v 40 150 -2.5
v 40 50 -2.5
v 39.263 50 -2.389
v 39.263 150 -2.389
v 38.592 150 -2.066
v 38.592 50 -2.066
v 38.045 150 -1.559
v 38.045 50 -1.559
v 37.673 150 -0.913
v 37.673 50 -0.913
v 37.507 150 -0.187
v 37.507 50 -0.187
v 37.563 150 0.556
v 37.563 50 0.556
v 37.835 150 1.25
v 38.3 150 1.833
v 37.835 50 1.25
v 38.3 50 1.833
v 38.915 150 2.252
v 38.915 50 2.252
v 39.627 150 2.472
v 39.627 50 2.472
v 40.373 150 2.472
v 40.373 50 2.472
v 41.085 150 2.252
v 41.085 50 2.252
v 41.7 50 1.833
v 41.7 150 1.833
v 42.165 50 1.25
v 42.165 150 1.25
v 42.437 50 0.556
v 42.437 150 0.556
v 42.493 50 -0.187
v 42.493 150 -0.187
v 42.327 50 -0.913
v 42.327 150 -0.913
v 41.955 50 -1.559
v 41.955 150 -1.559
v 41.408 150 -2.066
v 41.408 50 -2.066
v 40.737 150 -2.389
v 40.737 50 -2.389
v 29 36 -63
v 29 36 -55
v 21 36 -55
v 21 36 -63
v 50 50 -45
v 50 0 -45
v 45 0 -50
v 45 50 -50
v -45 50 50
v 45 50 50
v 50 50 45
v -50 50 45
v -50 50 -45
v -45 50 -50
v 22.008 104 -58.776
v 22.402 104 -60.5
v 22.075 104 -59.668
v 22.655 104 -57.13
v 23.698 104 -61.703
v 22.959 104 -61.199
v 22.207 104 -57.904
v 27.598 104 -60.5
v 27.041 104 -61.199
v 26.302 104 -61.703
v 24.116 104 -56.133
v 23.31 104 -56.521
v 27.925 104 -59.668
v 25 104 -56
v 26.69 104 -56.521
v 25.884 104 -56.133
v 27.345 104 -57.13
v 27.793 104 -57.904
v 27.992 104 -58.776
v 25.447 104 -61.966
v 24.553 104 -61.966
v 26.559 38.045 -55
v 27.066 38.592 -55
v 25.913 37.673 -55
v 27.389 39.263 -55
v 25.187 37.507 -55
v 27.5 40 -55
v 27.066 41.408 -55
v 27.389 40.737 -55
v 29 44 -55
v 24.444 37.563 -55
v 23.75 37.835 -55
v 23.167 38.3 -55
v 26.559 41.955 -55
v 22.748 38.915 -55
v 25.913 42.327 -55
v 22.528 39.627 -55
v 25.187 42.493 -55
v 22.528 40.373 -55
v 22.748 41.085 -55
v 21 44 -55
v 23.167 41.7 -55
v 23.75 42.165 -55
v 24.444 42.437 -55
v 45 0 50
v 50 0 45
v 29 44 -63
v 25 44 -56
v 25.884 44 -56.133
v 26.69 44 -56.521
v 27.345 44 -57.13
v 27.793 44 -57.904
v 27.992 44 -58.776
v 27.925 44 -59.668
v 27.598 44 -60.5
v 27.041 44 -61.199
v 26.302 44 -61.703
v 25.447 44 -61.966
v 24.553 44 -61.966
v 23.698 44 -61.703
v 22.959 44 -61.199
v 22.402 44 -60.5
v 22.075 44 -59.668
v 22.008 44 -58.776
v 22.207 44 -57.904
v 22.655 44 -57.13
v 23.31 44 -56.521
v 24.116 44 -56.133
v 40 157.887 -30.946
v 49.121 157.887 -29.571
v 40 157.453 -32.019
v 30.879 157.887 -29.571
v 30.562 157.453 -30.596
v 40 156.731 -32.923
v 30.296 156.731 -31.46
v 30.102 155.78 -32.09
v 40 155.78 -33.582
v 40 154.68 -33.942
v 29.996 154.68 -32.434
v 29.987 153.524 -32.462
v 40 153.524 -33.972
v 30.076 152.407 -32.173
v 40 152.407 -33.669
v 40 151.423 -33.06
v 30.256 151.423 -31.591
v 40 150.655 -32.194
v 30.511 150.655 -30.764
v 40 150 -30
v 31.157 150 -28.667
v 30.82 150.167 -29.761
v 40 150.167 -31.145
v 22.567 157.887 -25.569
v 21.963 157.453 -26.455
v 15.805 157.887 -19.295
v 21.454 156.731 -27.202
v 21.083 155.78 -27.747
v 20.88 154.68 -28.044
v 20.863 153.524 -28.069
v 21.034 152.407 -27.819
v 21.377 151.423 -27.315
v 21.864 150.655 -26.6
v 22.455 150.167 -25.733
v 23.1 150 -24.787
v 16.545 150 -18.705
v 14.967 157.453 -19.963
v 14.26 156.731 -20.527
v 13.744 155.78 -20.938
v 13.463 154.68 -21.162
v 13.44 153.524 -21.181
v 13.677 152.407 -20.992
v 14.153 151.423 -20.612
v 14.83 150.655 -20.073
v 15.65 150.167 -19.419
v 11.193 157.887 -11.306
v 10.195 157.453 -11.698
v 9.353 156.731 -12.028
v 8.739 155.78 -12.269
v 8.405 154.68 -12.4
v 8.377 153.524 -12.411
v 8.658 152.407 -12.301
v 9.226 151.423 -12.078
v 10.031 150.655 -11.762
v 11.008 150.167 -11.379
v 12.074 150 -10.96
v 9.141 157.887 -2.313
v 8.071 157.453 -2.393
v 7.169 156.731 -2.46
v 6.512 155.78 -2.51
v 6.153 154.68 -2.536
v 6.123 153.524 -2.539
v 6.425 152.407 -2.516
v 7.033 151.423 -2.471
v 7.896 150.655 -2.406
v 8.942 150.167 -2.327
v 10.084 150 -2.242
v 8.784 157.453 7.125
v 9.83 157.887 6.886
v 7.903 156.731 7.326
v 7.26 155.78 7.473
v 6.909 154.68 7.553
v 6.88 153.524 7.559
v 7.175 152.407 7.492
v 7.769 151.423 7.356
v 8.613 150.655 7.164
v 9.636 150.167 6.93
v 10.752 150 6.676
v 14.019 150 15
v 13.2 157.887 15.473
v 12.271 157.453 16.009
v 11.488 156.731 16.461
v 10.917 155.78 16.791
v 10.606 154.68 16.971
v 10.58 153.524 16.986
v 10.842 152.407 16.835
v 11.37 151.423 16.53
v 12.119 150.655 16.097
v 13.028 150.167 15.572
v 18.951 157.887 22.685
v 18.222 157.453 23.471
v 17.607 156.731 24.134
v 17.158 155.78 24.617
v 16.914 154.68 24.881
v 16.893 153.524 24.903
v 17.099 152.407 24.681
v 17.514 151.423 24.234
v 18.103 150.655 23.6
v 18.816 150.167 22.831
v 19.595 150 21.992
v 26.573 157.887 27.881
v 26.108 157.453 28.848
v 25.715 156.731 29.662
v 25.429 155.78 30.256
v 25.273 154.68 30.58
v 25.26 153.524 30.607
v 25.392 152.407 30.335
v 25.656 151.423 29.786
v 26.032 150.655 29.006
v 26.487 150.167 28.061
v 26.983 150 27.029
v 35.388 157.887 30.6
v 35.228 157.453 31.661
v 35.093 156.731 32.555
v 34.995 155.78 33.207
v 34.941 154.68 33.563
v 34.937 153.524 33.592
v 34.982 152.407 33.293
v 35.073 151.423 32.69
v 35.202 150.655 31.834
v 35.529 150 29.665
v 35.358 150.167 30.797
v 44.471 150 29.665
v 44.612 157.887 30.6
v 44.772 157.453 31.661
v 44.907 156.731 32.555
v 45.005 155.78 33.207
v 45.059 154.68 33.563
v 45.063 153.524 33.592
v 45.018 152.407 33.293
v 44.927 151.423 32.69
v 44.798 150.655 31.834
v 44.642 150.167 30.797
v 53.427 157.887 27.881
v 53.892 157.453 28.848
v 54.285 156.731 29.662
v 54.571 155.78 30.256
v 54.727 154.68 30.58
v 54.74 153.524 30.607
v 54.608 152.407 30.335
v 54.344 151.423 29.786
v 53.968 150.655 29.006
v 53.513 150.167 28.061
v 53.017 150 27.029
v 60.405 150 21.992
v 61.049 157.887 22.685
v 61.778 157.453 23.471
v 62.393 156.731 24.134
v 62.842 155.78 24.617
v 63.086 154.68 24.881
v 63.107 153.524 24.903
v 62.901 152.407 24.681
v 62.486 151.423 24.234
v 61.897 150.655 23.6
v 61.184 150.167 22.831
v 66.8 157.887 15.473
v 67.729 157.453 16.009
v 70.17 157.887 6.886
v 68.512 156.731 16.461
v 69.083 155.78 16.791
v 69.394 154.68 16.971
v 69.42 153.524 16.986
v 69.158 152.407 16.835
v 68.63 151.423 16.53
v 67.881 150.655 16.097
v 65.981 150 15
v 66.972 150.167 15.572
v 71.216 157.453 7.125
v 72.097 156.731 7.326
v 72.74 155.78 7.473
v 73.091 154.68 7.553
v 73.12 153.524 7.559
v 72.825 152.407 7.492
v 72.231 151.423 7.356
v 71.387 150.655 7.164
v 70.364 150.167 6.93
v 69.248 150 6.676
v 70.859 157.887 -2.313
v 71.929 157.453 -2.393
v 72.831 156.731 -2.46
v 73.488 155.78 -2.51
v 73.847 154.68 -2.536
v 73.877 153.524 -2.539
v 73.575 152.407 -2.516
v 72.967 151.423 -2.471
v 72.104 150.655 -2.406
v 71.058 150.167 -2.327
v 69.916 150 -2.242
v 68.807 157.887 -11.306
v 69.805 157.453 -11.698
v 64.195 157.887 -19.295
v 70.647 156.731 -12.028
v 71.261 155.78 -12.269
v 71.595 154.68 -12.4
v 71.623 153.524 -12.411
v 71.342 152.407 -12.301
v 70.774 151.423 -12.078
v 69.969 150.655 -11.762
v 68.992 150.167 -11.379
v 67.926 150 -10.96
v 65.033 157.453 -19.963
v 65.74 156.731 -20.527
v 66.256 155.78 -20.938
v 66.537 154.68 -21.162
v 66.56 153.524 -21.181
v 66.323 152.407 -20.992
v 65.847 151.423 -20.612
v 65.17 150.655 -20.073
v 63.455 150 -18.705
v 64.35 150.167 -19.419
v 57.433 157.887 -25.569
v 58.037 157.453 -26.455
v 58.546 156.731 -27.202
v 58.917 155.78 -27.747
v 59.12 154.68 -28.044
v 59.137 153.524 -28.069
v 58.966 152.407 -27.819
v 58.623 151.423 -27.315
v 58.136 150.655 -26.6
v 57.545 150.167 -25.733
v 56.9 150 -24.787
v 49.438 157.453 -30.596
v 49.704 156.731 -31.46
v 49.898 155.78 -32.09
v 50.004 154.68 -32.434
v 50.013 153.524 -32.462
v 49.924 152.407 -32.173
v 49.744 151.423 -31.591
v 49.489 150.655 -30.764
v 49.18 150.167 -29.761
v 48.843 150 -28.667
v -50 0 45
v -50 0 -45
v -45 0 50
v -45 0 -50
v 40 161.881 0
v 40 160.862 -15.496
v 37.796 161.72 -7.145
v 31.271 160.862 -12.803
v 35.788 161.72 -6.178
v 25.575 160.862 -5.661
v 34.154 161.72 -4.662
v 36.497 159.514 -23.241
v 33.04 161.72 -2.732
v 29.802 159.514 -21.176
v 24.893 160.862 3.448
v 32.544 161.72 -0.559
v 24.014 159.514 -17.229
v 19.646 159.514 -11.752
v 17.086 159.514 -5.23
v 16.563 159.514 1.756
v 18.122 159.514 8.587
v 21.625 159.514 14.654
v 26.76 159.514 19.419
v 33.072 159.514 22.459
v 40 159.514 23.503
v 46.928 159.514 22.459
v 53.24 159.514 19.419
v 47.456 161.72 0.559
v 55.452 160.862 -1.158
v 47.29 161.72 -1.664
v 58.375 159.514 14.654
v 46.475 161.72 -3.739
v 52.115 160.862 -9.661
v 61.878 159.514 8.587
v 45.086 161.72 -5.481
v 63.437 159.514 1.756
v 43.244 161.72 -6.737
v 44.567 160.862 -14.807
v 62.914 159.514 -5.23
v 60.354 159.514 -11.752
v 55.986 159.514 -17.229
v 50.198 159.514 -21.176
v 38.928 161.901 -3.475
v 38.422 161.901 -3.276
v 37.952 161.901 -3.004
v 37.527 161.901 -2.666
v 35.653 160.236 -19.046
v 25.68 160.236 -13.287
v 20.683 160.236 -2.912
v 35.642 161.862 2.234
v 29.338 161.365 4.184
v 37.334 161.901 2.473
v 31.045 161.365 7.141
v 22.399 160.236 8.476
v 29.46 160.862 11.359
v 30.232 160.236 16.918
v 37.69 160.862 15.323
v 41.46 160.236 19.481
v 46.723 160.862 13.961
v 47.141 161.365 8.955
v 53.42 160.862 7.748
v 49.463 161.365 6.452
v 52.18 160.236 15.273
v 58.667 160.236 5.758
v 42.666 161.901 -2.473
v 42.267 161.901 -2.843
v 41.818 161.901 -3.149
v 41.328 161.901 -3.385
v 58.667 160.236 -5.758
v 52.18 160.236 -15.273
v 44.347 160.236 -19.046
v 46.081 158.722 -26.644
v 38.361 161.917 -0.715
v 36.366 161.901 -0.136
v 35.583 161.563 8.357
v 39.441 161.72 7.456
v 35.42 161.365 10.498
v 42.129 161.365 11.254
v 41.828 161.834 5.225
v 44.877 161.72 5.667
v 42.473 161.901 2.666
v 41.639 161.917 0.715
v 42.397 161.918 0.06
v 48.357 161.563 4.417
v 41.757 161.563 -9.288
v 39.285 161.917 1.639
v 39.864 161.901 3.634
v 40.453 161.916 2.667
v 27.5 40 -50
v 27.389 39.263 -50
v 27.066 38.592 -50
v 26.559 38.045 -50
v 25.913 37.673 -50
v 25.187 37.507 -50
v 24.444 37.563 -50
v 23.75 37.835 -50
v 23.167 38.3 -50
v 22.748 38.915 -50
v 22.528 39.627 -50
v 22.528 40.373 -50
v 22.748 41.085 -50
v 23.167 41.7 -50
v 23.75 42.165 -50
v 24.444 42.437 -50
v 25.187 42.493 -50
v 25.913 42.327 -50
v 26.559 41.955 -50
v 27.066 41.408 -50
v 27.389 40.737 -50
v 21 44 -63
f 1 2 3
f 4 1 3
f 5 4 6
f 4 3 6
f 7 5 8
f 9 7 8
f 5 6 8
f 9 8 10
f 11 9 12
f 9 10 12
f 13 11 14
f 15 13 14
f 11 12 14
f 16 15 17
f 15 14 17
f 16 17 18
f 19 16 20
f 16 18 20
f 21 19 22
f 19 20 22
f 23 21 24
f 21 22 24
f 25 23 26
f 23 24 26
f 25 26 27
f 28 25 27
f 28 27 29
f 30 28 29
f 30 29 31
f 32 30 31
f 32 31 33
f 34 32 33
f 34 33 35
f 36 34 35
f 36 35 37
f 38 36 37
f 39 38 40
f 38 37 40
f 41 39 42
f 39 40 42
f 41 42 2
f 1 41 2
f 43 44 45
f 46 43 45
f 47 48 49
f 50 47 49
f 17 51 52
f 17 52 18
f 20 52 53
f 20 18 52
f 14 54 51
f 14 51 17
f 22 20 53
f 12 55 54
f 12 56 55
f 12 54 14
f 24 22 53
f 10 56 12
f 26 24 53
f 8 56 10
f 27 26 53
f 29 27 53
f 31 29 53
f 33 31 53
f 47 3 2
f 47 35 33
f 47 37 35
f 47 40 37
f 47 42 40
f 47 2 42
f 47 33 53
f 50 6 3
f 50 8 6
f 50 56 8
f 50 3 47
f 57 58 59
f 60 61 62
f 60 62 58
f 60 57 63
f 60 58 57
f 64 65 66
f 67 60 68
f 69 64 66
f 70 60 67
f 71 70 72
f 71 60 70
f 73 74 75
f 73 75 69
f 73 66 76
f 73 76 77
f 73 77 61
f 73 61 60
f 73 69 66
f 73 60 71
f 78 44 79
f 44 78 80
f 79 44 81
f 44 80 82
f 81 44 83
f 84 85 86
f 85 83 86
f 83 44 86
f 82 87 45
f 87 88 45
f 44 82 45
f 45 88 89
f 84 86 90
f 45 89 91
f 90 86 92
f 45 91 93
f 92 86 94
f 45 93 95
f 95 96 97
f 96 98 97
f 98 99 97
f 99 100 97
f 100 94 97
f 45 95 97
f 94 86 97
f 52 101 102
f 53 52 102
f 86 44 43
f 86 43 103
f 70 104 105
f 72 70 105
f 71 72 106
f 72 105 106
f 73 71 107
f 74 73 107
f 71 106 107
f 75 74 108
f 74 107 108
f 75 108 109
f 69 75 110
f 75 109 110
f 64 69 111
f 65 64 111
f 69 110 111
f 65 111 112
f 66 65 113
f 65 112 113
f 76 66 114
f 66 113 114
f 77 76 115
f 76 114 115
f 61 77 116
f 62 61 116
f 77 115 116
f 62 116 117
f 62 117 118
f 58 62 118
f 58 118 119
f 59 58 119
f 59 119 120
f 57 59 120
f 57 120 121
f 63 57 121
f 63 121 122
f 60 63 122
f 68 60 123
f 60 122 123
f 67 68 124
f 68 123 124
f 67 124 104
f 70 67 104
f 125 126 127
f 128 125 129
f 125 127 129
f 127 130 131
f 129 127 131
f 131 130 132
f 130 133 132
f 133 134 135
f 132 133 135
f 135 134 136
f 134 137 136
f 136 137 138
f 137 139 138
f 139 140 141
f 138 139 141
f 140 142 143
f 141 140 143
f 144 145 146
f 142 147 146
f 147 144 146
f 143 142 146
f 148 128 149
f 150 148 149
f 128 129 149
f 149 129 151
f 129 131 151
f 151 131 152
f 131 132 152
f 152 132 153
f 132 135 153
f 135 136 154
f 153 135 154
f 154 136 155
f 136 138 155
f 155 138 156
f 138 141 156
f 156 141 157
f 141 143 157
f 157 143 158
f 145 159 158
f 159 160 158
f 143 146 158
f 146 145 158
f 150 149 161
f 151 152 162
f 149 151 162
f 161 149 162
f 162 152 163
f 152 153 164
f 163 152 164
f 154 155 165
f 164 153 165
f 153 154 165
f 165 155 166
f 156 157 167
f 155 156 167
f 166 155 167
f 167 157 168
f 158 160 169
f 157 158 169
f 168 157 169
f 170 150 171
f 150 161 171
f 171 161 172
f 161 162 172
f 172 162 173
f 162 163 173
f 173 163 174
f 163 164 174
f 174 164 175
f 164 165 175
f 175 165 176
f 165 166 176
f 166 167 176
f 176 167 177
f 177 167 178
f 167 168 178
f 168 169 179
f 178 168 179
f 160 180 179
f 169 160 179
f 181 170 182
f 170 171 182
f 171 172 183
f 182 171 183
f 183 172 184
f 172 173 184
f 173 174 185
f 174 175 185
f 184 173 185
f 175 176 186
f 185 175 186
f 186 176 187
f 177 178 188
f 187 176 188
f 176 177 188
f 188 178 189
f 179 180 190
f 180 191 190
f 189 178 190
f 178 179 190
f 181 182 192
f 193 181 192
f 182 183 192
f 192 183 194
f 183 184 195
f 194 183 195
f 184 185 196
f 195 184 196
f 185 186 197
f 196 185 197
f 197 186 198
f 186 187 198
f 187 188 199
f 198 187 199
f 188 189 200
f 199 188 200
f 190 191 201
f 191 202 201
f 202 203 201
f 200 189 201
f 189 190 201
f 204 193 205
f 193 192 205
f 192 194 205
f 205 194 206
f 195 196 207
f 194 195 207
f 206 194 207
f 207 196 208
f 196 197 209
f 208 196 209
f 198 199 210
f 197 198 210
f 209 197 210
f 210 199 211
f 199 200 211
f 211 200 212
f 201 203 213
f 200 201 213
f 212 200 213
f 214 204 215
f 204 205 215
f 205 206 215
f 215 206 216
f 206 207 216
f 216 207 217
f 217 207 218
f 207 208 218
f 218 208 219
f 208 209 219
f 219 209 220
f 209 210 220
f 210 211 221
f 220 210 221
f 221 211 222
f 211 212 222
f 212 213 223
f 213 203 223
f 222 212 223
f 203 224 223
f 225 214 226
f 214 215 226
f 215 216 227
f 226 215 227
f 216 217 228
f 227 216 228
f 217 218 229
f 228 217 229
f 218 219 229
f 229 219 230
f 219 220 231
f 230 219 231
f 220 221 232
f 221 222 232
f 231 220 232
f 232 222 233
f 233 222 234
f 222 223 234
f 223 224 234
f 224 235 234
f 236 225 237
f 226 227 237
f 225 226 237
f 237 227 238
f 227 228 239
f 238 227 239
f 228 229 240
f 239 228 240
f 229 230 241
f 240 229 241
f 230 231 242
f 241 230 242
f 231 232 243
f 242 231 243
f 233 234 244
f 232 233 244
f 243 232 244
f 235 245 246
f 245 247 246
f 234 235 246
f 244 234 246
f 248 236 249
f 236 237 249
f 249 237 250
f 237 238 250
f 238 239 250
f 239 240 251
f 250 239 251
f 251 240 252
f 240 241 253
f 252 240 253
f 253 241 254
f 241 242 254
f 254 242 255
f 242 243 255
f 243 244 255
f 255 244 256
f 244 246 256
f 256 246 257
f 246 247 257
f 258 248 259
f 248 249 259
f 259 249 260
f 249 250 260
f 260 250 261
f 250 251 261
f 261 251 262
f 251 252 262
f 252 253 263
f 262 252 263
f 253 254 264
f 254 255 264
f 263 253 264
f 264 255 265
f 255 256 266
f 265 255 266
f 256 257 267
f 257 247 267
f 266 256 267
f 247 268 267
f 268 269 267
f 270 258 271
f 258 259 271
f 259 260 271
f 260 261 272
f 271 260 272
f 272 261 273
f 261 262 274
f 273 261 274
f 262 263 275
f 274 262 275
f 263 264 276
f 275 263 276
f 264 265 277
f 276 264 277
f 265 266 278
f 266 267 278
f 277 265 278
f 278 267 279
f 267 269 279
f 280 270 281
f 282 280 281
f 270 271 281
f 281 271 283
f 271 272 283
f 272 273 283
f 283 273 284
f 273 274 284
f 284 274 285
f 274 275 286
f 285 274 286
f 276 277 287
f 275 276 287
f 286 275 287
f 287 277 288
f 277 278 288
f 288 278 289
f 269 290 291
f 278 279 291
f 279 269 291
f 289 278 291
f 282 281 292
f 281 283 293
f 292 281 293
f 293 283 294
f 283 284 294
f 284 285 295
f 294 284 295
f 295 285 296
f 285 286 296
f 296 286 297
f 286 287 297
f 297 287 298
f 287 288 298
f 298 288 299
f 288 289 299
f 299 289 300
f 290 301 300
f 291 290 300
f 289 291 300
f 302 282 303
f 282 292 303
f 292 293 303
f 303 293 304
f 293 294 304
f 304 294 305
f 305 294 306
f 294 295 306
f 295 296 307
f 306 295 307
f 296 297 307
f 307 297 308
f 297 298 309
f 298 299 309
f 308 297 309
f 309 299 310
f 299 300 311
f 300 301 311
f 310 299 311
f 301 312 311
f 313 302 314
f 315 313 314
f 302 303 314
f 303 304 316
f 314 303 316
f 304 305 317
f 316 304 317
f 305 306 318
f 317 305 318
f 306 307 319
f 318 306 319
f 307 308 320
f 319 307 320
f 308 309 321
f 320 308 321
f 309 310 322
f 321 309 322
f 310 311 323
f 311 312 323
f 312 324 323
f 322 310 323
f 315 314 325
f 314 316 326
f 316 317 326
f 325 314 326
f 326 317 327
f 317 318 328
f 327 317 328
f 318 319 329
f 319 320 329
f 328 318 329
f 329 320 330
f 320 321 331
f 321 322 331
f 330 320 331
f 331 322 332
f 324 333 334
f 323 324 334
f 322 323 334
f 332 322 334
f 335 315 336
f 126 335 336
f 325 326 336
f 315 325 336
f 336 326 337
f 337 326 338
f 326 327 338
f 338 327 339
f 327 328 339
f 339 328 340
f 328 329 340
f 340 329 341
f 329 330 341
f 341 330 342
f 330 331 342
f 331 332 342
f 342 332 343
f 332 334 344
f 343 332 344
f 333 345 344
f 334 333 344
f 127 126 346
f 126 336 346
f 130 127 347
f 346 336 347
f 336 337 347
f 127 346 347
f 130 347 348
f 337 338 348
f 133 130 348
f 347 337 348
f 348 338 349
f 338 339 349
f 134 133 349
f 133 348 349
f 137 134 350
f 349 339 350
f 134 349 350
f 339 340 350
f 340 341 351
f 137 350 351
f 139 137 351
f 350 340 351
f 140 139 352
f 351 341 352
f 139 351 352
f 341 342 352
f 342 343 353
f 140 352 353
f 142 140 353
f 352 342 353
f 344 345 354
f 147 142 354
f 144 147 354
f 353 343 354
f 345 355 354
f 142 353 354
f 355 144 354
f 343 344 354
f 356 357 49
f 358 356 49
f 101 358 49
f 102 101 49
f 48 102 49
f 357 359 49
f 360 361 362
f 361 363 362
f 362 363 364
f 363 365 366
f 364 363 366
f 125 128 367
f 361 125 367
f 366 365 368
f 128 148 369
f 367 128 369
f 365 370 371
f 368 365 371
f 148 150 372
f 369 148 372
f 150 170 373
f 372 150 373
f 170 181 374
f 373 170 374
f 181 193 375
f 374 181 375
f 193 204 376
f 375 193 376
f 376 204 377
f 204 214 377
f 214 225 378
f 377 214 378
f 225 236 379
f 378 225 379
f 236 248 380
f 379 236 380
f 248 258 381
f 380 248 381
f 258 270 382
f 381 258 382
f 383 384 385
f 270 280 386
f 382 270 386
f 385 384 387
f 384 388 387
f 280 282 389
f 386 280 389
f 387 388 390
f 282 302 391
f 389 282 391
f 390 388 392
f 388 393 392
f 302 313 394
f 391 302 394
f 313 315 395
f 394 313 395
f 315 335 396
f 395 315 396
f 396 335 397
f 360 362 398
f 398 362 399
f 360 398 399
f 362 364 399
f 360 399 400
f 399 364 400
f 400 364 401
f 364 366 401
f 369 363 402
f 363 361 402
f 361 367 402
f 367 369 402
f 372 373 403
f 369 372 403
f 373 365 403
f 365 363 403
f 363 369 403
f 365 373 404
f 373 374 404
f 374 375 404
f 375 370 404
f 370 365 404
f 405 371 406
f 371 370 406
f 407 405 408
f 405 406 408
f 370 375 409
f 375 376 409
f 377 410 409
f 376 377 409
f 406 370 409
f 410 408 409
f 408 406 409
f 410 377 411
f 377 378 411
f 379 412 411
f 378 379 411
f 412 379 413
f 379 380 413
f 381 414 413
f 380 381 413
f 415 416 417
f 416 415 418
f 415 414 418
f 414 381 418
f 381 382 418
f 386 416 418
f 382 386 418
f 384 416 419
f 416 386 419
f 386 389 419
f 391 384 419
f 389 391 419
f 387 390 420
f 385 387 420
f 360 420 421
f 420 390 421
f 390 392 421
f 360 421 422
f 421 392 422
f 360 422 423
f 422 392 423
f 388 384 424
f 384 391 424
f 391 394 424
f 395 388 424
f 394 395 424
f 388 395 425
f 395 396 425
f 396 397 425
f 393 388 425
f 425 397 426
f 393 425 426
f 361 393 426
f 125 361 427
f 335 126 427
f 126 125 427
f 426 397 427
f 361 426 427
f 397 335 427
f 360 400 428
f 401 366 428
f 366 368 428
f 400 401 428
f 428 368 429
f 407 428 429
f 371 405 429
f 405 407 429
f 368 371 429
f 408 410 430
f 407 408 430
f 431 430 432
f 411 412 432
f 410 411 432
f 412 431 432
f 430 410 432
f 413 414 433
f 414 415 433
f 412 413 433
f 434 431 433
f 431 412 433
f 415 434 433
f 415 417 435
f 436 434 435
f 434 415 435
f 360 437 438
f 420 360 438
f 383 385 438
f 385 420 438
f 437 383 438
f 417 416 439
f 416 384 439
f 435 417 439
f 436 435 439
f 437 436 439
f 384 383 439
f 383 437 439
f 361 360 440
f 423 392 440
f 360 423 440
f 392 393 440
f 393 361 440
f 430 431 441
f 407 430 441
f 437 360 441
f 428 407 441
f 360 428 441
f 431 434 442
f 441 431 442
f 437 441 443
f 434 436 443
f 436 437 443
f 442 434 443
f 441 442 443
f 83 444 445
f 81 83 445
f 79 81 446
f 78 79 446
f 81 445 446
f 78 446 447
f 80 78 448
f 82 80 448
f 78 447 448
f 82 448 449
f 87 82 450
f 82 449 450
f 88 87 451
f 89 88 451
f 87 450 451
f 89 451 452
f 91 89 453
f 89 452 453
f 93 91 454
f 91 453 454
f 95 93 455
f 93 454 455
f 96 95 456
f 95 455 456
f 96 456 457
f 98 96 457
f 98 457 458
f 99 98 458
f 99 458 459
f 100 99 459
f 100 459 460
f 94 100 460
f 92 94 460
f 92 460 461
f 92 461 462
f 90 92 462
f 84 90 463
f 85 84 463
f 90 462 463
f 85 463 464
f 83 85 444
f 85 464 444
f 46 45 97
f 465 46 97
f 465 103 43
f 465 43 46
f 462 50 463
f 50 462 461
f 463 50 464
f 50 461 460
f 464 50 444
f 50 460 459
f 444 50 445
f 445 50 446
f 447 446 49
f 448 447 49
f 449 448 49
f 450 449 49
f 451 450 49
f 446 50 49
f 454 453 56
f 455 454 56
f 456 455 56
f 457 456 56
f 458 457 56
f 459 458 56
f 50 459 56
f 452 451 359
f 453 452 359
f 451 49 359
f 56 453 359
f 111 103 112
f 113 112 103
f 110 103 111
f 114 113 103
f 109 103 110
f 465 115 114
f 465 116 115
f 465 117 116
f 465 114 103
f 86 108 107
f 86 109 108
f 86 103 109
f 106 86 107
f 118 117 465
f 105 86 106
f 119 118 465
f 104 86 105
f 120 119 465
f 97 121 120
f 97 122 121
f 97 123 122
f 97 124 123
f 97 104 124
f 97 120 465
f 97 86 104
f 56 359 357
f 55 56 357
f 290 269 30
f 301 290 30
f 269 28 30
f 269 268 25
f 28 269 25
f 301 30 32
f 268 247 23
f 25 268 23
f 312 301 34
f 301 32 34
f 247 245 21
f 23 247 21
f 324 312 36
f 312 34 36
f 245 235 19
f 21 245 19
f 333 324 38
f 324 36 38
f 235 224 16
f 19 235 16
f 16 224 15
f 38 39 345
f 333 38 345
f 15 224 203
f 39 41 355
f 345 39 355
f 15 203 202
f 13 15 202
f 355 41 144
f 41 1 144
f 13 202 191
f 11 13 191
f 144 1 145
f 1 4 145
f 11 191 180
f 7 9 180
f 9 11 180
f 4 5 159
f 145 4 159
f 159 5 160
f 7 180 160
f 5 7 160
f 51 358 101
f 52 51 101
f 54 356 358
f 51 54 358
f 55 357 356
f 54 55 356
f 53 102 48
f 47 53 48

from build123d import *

# Parameters (mm, degrees)
EXTRUDE_1_DEPTH = 50
SKETCH_2_R      = 2.5
EXTRUDE_2_DEPTH = 100
SKETCH_5_R      = 2.5
EXTRUDE_3_DEPTH = 5
SKETCH_6_W      = 8
SKETCH_6_H      = 8
EXTRUDE_4_DEPTH = 8
SKETCH_7_R      = 3
EXTRUDE_5_DEPTH = 60


with BuildPart() as part:
    # 草圖1 → 填料-伸長1 (new body)
    with BuildSketch(Plane(origin=(0, 0, 0), x_dir=(1, 0, 0), z_dir=(0, 1, 0))):
        Polygon((-50, 45), (-50, -45), (-45, -50), (45, -50), (50, -45), (50, 45), (45, 50), (-45, 50), align=None)
    extrude(amount=EXTRUDE_1_DEPTH)

    # 草圖2 → 填料-伸長2 (add)
    with BuildSketch(Plane(origin=(0, 50, 0), x_dir=(1, 0, 0), z_dir=(0, 1, 0))):
        with Locations(Location((40, 0, 0), (0, 0, 90))):
            Circle(SKETCH_2_R)
    extrude(amount=EXTRUDE_2_DEPTH)

    # 草圖4 → 旋轉1 (revolve)
    with BuildSketch(Plane.XY, mode=Mode.PRIVATE) as revolve_1_sk:
        with BuildLine():
            Line((40, 150), (40, 161.880718379))
            add(Edge.make_bspline(
                [(40, 161.880718379), (49.36254318, 162.224748332), (61.644131944, 160.150653719), (70.94600245, 157.886525359)],
                knots=[0, 0, 0, 0, 1, 1, 1, 1], degree=3))
            ThreePointArc((70.94600245, 157.886525359), (73.971530022, 153.523608058), (70, 150))
            Line((70, 150), (40, 150))
        make_face()
    revolve(revolve_1_sk.sketch.rotate(Axis((40, 150, 0), (0, 1, 0)), 90), axis=Axis((40, 150, 0), (0, 1, 0)))

    # 草圖5 → 填料-伸長3 (add)
    with BuildSketch(Plane(origin=(0, 0, -50), x_dir=(-1, 0, 0), z_dir=(0, 0, -1))):
        with Locations(Location((-25, 40, 0), (0, 0, 180))):
            Circle(SKETCH_5_R)
    extrude(amount=EXTRUDE_3_DEPTH)

    # 草圖6 → 填料-伸長4 (add)
    with BuildSketch(Plane(origin=(0, 0, -55), x_dir=(-1, 0, 0), z_dir=(0, 0, -1))):
        with Locations((-25, 40)):
            Rectangle(SKETCH_6_W, SKETCH_6_H)
    extrude(amount=EXTRUDE_4_DEPTH)

    # 草圖7 → 填料-伸長5 (add)
    with BuildSketch(Plane(origin=(0, 44, 0), x_dir=(1, 0, 0), z_dir=(0, 1, 0))):
        with Locations(Location((25, 59, 0), (0, 0, 270))):
            Circle(SKETCH_7_R)
    extrude(amount=EXTRUDE_5_DEPTH)


solid = part.part
